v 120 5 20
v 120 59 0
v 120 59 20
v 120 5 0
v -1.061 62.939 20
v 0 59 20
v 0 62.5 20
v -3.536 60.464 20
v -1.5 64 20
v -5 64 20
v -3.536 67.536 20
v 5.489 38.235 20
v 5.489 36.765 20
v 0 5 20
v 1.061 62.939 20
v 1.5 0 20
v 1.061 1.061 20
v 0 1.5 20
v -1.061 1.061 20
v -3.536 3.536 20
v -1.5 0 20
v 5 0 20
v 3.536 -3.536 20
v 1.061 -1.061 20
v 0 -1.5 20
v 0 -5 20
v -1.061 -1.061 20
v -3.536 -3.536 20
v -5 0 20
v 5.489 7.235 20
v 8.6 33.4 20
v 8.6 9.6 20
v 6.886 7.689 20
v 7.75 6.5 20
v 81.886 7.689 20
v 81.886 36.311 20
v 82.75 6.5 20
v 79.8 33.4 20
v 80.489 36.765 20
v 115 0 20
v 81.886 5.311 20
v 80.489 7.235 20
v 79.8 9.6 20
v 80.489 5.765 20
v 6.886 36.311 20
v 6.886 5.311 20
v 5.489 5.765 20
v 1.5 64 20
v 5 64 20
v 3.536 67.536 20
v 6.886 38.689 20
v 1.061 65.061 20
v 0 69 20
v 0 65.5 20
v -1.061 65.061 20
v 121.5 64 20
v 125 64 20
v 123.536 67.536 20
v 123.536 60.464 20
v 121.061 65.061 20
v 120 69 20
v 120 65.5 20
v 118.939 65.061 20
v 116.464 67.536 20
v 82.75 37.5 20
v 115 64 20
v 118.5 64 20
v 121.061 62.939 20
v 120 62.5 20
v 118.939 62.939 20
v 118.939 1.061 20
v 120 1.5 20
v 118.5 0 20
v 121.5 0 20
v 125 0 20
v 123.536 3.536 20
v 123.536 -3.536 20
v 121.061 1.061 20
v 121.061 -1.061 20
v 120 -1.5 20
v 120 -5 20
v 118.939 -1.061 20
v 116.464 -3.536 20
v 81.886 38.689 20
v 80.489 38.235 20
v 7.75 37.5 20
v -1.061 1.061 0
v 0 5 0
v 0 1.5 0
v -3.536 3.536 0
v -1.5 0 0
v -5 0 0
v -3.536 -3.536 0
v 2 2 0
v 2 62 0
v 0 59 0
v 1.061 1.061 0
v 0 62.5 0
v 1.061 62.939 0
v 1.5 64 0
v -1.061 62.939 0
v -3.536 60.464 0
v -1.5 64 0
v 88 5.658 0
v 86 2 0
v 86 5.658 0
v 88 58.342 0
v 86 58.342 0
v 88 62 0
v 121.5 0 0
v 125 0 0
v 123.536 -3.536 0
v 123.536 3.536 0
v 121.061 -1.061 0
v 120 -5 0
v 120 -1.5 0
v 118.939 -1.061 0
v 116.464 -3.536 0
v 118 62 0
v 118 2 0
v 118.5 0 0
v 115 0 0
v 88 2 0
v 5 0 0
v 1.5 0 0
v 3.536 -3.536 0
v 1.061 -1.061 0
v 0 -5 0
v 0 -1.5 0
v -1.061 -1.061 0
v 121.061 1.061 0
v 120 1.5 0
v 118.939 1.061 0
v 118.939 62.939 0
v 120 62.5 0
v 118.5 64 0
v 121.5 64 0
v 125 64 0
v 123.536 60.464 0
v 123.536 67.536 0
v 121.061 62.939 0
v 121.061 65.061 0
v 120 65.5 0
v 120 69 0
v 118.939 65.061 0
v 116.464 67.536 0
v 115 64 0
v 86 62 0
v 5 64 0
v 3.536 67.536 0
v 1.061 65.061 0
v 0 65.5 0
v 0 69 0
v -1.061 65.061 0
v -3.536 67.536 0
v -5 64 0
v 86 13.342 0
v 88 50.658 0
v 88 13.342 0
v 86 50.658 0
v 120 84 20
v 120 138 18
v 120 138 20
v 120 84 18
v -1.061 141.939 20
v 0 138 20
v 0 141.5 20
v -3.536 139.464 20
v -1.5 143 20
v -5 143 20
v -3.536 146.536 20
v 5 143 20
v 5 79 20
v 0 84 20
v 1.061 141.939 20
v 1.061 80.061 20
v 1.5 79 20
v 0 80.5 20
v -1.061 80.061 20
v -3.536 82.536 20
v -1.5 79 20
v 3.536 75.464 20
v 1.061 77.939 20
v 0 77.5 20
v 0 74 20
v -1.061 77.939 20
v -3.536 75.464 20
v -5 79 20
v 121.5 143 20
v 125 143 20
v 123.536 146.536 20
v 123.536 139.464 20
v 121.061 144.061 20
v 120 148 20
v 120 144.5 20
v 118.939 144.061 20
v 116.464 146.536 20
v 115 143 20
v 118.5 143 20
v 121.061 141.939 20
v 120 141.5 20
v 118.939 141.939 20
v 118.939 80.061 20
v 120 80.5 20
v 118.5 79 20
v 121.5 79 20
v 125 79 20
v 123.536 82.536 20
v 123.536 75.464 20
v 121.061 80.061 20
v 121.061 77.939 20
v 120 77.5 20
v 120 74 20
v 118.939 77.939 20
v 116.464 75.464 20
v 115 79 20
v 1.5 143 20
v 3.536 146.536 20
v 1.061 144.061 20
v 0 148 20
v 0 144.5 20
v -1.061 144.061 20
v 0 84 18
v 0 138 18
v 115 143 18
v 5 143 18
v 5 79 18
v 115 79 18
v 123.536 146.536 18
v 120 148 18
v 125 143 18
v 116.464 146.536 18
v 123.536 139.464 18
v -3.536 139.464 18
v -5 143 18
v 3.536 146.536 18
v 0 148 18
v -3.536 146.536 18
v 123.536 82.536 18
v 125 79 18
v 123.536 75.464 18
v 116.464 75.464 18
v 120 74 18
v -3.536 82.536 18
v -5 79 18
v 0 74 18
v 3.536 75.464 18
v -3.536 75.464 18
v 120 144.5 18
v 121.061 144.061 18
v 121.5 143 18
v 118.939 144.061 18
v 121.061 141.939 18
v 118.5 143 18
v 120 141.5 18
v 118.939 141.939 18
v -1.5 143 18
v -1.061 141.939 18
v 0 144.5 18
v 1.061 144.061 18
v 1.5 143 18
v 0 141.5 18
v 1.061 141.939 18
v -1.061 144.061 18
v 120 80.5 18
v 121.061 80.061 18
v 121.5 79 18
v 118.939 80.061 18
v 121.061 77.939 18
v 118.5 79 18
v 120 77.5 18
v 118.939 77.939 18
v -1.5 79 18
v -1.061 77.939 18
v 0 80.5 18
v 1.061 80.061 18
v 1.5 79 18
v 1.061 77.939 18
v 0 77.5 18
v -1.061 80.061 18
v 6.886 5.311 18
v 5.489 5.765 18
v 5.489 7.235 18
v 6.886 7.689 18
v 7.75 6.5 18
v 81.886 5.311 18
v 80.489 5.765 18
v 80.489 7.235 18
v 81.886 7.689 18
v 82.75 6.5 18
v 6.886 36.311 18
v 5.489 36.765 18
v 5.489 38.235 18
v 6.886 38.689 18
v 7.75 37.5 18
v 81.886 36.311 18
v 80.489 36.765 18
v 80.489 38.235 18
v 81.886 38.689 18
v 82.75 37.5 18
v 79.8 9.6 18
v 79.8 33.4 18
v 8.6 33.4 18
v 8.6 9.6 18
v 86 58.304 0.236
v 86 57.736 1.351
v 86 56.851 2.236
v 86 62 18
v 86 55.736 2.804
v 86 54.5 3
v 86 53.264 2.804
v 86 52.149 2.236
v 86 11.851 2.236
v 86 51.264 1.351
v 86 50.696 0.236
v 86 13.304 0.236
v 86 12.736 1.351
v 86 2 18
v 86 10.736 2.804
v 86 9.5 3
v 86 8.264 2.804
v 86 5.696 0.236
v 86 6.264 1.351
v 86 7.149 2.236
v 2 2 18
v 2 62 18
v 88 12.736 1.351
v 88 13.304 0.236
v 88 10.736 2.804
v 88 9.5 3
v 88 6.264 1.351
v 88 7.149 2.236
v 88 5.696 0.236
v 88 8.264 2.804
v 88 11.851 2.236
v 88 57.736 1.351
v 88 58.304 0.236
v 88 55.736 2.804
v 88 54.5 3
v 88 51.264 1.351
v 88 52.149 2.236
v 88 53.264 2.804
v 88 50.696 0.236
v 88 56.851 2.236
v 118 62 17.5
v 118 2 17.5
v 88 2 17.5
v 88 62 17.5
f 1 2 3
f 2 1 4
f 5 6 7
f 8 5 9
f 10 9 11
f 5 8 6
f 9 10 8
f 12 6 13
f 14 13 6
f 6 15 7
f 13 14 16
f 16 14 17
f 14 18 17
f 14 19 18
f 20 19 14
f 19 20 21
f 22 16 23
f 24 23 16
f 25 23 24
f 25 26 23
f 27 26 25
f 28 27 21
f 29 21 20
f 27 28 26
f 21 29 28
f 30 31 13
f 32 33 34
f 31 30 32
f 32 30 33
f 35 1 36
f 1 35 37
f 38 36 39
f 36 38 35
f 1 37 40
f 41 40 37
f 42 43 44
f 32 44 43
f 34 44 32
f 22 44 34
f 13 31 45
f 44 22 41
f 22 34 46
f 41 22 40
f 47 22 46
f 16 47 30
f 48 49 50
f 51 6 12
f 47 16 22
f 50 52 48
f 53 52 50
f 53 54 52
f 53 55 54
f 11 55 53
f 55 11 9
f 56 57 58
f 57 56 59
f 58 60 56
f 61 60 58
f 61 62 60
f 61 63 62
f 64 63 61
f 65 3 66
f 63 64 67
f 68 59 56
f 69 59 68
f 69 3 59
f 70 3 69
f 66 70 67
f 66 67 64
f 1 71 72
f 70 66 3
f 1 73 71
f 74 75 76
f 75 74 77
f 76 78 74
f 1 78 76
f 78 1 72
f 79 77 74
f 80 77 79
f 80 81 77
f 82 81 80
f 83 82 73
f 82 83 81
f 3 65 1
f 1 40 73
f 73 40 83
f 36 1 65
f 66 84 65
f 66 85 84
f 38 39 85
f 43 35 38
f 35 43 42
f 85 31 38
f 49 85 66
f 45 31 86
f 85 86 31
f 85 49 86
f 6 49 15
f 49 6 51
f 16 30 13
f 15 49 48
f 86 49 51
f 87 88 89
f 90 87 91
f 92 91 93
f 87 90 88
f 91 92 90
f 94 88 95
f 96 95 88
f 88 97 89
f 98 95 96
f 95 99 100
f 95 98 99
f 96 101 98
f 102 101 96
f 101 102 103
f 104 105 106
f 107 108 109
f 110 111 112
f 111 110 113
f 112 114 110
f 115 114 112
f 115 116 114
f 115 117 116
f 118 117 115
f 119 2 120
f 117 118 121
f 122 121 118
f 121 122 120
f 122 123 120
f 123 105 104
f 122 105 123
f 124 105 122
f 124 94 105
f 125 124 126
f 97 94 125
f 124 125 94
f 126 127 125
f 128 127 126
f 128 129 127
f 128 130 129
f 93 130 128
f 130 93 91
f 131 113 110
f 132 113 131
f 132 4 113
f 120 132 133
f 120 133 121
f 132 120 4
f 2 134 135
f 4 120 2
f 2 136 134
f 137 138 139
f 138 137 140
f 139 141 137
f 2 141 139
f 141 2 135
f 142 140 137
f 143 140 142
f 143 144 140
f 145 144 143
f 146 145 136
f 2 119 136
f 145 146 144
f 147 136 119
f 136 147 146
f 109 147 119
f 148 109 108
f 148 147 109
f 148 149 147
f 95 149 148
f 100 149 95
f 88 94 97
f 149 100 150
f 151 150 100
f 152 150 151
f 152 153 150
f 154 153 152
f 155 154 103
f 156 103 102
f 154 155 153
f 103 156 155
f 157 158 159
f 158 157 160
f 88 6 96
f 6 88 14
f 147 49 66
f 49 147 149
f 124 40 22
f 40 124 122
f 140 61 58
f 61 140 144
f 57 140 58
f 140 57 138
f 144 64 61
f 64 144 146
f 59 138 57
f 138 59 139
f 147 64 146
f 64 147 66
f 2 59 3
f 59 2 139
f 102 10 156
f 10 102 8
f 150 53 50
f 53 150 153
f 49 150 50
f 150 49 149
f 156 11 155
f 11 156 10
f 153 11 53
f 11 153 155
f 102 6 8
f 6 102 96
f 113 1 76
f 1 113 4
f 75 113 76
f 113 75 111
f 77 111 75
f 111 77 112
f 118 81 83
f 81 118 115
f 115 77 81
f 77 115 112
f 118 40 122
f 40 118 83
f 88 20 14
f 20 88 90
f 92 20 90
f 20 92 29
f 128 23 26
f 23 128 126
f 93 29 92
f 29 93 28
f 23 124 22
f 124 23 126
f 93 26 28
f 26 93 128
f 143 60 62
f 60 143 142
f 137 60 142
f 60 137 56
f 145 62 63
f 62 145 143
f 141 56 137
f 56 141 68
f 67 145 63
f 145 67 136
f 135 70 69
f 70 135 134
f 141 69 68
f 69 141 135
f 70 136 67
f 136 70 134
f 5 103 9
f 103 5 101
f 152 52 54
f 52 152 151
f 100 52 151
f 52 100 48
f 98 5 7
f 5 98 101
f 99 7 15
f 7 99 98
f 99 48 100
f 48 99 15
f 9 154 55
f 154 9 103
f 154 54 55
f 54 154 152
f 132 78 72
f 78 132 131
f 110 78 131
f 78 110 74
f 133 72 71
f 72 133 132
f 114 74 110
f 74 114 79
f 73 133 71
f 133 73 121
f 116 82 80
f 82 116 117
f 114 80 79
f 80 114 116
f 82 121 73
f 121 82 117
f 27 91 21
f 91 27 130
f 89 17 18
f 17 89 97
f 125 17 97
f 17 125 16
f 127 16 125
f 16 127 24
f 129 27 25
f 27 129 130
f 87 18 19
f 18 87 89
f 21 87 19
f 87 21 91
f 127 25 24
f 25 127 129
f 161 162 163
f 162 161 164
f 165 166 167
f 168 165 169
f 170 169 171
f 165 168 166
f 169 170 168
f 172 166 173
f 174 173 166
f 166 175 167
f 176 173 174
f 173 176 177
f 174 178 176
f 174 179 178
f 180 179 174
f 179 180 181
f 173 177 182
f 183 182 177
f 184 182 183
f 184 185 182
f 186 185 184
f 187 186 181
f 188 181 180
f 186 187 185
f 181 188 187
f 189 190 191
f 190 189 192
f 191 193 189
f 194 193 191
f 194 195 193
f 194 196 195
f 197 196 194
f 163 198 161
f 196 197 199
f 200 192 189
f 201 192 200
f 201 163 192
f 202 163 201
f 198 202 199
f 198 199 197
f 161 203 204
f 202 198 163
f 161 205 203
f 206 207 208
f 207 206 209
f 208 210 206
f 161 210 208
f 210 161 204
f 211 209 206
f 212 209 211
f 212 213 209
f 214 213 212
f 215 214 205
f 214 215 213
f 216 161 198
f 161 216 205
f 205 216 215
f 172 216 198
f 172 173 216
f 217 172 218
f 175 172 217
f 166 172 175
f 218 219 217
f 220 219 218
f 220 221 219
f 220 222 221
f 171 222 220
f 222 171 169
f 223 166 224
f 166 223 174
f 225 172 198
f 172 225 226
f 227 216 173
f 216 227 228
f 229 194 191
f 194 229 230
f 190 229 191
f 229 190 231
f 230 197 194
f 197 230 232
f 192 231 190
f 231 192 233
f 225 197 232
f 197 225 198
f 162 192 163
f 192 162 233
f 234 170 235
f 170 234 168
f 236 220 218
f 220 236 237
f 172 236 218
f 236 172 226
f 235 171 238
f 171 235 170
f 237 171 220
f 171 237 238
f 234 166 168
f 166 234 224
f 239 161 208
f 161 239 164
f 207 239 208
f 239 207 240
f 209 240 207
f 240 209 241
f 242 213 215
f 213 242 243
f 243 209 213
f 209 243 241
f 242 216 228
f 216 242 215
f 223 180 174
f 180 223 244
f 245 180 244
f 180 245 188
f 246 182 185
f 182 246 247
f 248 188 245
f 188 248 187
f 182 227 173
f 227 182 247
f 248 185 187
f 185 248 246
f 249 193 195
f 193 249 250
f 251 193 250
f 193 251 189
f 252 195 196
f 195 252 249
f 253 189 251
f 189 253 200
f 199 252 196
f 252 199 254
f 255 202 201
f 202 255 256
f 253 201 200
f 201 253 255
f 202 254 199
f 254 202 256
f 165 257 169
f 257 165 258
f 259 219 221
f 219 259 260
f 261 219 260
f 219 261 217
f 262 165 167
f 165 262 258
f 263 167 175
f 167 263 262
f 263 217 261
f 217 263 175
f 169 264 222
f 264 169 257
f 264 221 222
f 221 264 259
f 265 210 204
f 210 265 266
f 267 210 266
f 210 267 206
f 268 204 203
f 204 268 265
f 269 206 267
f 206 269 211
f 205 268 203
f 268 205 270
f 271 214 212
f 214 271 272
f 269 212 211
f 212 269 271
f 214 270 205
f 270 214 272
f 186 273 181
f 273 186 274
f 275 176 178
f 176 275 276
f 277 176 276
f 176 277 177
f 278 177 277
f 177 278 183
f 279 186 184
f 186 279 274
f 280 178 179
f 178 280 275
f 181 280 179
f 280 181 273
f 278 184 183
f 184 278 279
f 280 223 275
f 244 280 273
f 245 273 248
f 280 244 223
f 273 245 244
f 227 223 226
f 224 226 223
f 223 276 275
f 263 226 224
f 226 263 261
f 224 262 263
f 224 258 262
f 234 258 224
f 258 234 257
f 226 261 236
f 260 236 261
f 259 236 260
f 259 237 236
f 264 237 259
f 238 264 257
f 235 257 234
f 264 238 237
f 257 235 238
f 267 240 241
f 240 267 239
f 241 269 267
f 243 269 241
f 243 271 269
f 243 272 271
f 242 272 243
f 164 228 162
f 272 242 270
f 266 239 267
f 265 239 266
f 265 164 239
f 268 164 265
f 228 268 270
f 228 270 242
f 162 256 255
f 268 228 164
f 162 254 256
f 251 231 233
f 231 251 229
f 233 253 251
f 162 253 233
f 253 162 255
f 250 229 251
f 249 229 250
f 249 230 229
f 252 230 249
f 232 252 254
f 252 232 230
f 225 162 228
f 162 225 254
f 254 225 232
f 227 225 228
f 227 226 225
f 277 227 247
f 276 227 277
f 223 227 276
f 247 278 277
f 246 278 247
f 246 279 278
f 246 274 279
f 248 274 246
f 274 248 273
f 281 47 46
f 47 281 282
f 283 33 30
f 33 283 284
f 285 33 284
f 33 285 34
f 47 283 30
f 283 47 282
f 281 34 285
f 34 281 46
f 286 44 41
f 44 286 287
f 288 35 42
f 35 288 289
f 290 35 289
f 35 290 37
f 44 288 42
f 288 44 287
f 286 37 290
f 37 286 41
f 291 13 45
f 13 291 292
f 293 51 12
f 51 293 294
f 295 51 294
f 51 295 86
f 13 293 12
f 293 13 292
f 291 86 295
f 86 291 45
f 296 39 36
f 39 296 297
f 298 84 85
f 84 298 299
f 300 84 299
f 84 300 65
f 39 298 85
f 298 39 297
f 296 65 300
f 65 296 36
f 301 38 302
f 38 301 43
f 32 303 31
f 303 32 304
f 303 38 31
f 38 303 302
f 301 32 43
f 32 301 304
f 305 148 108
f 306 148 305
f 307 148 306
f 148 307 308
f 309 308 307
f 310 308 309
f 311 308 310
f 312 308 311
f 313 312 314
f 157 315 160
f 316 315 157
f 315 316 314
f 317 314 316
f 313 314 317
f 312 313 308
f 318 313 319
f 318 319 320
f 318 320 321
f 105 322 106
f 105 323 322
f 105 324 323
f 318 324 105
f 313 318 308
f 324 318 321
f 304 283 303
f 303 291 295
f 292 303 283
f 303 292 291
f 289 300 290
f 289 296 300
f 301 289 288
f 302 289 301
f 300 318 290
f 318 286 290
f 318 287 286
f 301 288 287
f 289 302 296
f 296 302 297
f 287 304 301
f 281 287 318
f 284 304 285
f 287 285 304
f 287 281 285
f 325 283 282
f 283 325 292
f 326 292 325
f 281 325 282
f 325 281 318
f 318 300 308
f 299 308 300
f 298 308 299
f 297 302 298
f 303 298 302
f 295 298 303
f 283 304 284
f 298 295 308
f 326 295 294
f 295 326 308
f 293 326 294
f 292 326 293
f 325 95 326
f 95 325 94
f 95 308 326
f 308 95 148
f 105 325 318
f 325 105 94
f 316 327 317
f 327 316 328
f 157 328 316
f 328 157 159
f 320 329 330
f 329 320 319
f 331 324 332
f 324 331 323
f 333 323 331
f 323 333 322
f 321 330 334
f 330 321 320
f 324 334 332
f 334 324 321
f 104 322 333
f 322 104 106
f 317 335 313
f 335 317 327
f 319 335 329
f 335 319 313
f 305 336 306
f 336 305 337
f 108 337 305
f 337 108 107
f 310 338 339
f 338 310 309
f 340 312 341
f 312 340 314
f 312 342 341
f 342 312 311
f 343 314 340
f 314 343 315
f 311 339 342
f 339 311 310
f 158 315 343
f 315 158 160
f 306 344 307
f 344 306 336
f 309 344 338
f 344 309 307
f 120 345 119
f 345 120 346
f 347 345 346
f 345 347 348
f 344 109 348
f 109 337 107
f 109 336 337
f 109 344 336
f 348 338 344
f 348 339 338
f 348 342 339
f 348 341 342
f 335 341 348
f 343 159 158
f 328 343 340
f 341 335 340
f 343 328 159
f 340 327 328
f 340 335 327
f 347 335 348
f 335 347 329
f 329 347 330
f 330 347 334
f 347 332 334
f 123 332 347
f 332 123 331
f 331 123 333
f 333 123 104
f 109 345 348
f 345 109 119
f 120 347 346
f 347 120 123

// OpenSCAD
// Outer Case Dimensions
// **********************************************

case_length 			= 120;
case_height 			= 20;
case_thickness			= 2;
case_corner_diameter 	= 10;

case_cutout_length		= 84;
case_cutout_width		= 60;

// Nut and bolt dimensions
// **********************************************

bolt_diameter			= 3;

// Sensor Dimensions
// **********************************************

dht11_length			= 10;
dht11_width				= 10;
dht11_height			= 10;
dht11_depth				= 6;

// 9V battery Size
// **********************************************

batt_height 			= 60;
batt_length				= 30;
batt_Width				= 17.5;

// LCD Dimensions
// **********************************************

LCD_board_height		= 1.6;
LCD_board_length		= 80;
LCD_board_width			= 36;
LCD_board_hole_diameter = 2.5;
LCD_board_hole_2edge	= 2.5;

LCD_display_length		= 71.2;
LCD_display_width		= 23.8;
LCD_display_height		= 8.6;
LCD_display_x_pos		= 4.6;
LCD_display_y_pos		= 5.6;


case_width 				= max(batt_Width, case_cutout_width)+case_thickness*2;

// Assemble the Enclosure Here
// **********************************************

case_lid();

difference(){
	case();
	translate([case_thickness+2, case_thickness+2, case_height-4]){
		LCD_board();
		LCD_display();
		LCD_board_holes();
	}
	translate([case_thickness, case_thickness, -1]){
		case_main_cutout();
	}
	translate ([
		case_length - batt_length - case_thickness,
		case_thickness,
		-1]){
			cube ([ batt_length, batt_height, batt_Width+1]);
	}
}

// Modules Go Here
// **********************************************
module LCD_display(){
	translate([
		LCD_display_x_pos, 
		LCD_display_y_pos, 
		LCD_board_height])
		cube ([LCD_display_length, LCD_display_width, LCD_display_height]);
}
module LCD_board_holes(){
	translate ([LCD_board_hole_2edge, LCD_board_hole_2edge, 4]) 
		cylinder (r=LCD_board_hole_diameter/2, h=10, center = true);
	translate ([LCD_board_length-LCD_board_hole_2edge, LCD_board_hole_2edge, 4]) 
		cylinder (r=LCD_board_hole_diameter/2, h=10, center = true);
	translate ([LCD_board_hole_2edge, LCD_board_width-LCD_board_hole_2edge, 4]) 
		cylinder (r=LCD_board_hole_diameter/2, h=10, center = true);
	translate ([LCD_board_length - LCD_board_hole_2edge, LCD_board_width-LCD_board_hole_2edge, 4]) 
		cylinder (r=LCD_board_hole_diameter/2, h=10, center = true);
}
module LCD_board(){
	cube ([LCD_board_length, LCD_board_width, LCD_board_height]);
}
module case_lid(){
	translate([0, case_width +case_corner_diameter+5, 0]){
		difference(){
			case();
			translate([
				-case_corner_diameter-1,
				-case_corner_diameter-1,
				-case_thickness])
					cube([
						case_length+case_corner_diameter*2, 
						case_width+case_corner_diameter*2, 
						case_height]);
		}
	}
}
module case(){
	translate([case_length/2, case_width/2, case_height/2]){
		difference (){
			union (){
				cube([case_length, case_width, case_height], center = true);
				translate ([case_length/2, case_width/2, 0]){
					corner();
					}
				translate ([-case_length/2, case_width/2, 0]){
					corner();
					}
				translate ([case_length/2, -case_width/2, 0]){
					corner();
					}
				translate ([-case_length/2, -case_width/2, 0]){
					corner();
					}
				}
				translate ([case_length/2, case_width/2, 0]){
					corner_holes();
					}
				translate ([-case_length/2, case_width/2, 0]){
					corner_holes();
					}
				translate ([case_length/2, -case_width/2, 0]){
					corner_holes();
					}
				translate ([-case_length/2, -case_width/2, 0]){
					corner_holes();
		}
	}
}
}
module case_main_cutout(){
	cube ([case_cutout_length, case_cutout_width, case_height-case_thickness+1]);
	translate([case_cutout_length,case_cutout_width/8,0] ){
		rotate([90,0,90])
			#cylinder (r = 4, h = 10, center = true, $fn = 20);
	}
	translate([case_cutout_length,case_cutout_width/8*7,0] ){
		rotate([90,0,90])
			#cylinder (r = 4, h = 10, center = true, $fn = 20);
	}
}
module corner(){
	difference(){
		cylinder (r = case_corner_diameter/2, h = case_height, center = true, $fn = 8);
	}
}
module corner_holes(){
	translate([0,0,-1])
		cylinder (r = bolt_diameter/2, h = case_height+5, center = true, $fn = 8);
}
